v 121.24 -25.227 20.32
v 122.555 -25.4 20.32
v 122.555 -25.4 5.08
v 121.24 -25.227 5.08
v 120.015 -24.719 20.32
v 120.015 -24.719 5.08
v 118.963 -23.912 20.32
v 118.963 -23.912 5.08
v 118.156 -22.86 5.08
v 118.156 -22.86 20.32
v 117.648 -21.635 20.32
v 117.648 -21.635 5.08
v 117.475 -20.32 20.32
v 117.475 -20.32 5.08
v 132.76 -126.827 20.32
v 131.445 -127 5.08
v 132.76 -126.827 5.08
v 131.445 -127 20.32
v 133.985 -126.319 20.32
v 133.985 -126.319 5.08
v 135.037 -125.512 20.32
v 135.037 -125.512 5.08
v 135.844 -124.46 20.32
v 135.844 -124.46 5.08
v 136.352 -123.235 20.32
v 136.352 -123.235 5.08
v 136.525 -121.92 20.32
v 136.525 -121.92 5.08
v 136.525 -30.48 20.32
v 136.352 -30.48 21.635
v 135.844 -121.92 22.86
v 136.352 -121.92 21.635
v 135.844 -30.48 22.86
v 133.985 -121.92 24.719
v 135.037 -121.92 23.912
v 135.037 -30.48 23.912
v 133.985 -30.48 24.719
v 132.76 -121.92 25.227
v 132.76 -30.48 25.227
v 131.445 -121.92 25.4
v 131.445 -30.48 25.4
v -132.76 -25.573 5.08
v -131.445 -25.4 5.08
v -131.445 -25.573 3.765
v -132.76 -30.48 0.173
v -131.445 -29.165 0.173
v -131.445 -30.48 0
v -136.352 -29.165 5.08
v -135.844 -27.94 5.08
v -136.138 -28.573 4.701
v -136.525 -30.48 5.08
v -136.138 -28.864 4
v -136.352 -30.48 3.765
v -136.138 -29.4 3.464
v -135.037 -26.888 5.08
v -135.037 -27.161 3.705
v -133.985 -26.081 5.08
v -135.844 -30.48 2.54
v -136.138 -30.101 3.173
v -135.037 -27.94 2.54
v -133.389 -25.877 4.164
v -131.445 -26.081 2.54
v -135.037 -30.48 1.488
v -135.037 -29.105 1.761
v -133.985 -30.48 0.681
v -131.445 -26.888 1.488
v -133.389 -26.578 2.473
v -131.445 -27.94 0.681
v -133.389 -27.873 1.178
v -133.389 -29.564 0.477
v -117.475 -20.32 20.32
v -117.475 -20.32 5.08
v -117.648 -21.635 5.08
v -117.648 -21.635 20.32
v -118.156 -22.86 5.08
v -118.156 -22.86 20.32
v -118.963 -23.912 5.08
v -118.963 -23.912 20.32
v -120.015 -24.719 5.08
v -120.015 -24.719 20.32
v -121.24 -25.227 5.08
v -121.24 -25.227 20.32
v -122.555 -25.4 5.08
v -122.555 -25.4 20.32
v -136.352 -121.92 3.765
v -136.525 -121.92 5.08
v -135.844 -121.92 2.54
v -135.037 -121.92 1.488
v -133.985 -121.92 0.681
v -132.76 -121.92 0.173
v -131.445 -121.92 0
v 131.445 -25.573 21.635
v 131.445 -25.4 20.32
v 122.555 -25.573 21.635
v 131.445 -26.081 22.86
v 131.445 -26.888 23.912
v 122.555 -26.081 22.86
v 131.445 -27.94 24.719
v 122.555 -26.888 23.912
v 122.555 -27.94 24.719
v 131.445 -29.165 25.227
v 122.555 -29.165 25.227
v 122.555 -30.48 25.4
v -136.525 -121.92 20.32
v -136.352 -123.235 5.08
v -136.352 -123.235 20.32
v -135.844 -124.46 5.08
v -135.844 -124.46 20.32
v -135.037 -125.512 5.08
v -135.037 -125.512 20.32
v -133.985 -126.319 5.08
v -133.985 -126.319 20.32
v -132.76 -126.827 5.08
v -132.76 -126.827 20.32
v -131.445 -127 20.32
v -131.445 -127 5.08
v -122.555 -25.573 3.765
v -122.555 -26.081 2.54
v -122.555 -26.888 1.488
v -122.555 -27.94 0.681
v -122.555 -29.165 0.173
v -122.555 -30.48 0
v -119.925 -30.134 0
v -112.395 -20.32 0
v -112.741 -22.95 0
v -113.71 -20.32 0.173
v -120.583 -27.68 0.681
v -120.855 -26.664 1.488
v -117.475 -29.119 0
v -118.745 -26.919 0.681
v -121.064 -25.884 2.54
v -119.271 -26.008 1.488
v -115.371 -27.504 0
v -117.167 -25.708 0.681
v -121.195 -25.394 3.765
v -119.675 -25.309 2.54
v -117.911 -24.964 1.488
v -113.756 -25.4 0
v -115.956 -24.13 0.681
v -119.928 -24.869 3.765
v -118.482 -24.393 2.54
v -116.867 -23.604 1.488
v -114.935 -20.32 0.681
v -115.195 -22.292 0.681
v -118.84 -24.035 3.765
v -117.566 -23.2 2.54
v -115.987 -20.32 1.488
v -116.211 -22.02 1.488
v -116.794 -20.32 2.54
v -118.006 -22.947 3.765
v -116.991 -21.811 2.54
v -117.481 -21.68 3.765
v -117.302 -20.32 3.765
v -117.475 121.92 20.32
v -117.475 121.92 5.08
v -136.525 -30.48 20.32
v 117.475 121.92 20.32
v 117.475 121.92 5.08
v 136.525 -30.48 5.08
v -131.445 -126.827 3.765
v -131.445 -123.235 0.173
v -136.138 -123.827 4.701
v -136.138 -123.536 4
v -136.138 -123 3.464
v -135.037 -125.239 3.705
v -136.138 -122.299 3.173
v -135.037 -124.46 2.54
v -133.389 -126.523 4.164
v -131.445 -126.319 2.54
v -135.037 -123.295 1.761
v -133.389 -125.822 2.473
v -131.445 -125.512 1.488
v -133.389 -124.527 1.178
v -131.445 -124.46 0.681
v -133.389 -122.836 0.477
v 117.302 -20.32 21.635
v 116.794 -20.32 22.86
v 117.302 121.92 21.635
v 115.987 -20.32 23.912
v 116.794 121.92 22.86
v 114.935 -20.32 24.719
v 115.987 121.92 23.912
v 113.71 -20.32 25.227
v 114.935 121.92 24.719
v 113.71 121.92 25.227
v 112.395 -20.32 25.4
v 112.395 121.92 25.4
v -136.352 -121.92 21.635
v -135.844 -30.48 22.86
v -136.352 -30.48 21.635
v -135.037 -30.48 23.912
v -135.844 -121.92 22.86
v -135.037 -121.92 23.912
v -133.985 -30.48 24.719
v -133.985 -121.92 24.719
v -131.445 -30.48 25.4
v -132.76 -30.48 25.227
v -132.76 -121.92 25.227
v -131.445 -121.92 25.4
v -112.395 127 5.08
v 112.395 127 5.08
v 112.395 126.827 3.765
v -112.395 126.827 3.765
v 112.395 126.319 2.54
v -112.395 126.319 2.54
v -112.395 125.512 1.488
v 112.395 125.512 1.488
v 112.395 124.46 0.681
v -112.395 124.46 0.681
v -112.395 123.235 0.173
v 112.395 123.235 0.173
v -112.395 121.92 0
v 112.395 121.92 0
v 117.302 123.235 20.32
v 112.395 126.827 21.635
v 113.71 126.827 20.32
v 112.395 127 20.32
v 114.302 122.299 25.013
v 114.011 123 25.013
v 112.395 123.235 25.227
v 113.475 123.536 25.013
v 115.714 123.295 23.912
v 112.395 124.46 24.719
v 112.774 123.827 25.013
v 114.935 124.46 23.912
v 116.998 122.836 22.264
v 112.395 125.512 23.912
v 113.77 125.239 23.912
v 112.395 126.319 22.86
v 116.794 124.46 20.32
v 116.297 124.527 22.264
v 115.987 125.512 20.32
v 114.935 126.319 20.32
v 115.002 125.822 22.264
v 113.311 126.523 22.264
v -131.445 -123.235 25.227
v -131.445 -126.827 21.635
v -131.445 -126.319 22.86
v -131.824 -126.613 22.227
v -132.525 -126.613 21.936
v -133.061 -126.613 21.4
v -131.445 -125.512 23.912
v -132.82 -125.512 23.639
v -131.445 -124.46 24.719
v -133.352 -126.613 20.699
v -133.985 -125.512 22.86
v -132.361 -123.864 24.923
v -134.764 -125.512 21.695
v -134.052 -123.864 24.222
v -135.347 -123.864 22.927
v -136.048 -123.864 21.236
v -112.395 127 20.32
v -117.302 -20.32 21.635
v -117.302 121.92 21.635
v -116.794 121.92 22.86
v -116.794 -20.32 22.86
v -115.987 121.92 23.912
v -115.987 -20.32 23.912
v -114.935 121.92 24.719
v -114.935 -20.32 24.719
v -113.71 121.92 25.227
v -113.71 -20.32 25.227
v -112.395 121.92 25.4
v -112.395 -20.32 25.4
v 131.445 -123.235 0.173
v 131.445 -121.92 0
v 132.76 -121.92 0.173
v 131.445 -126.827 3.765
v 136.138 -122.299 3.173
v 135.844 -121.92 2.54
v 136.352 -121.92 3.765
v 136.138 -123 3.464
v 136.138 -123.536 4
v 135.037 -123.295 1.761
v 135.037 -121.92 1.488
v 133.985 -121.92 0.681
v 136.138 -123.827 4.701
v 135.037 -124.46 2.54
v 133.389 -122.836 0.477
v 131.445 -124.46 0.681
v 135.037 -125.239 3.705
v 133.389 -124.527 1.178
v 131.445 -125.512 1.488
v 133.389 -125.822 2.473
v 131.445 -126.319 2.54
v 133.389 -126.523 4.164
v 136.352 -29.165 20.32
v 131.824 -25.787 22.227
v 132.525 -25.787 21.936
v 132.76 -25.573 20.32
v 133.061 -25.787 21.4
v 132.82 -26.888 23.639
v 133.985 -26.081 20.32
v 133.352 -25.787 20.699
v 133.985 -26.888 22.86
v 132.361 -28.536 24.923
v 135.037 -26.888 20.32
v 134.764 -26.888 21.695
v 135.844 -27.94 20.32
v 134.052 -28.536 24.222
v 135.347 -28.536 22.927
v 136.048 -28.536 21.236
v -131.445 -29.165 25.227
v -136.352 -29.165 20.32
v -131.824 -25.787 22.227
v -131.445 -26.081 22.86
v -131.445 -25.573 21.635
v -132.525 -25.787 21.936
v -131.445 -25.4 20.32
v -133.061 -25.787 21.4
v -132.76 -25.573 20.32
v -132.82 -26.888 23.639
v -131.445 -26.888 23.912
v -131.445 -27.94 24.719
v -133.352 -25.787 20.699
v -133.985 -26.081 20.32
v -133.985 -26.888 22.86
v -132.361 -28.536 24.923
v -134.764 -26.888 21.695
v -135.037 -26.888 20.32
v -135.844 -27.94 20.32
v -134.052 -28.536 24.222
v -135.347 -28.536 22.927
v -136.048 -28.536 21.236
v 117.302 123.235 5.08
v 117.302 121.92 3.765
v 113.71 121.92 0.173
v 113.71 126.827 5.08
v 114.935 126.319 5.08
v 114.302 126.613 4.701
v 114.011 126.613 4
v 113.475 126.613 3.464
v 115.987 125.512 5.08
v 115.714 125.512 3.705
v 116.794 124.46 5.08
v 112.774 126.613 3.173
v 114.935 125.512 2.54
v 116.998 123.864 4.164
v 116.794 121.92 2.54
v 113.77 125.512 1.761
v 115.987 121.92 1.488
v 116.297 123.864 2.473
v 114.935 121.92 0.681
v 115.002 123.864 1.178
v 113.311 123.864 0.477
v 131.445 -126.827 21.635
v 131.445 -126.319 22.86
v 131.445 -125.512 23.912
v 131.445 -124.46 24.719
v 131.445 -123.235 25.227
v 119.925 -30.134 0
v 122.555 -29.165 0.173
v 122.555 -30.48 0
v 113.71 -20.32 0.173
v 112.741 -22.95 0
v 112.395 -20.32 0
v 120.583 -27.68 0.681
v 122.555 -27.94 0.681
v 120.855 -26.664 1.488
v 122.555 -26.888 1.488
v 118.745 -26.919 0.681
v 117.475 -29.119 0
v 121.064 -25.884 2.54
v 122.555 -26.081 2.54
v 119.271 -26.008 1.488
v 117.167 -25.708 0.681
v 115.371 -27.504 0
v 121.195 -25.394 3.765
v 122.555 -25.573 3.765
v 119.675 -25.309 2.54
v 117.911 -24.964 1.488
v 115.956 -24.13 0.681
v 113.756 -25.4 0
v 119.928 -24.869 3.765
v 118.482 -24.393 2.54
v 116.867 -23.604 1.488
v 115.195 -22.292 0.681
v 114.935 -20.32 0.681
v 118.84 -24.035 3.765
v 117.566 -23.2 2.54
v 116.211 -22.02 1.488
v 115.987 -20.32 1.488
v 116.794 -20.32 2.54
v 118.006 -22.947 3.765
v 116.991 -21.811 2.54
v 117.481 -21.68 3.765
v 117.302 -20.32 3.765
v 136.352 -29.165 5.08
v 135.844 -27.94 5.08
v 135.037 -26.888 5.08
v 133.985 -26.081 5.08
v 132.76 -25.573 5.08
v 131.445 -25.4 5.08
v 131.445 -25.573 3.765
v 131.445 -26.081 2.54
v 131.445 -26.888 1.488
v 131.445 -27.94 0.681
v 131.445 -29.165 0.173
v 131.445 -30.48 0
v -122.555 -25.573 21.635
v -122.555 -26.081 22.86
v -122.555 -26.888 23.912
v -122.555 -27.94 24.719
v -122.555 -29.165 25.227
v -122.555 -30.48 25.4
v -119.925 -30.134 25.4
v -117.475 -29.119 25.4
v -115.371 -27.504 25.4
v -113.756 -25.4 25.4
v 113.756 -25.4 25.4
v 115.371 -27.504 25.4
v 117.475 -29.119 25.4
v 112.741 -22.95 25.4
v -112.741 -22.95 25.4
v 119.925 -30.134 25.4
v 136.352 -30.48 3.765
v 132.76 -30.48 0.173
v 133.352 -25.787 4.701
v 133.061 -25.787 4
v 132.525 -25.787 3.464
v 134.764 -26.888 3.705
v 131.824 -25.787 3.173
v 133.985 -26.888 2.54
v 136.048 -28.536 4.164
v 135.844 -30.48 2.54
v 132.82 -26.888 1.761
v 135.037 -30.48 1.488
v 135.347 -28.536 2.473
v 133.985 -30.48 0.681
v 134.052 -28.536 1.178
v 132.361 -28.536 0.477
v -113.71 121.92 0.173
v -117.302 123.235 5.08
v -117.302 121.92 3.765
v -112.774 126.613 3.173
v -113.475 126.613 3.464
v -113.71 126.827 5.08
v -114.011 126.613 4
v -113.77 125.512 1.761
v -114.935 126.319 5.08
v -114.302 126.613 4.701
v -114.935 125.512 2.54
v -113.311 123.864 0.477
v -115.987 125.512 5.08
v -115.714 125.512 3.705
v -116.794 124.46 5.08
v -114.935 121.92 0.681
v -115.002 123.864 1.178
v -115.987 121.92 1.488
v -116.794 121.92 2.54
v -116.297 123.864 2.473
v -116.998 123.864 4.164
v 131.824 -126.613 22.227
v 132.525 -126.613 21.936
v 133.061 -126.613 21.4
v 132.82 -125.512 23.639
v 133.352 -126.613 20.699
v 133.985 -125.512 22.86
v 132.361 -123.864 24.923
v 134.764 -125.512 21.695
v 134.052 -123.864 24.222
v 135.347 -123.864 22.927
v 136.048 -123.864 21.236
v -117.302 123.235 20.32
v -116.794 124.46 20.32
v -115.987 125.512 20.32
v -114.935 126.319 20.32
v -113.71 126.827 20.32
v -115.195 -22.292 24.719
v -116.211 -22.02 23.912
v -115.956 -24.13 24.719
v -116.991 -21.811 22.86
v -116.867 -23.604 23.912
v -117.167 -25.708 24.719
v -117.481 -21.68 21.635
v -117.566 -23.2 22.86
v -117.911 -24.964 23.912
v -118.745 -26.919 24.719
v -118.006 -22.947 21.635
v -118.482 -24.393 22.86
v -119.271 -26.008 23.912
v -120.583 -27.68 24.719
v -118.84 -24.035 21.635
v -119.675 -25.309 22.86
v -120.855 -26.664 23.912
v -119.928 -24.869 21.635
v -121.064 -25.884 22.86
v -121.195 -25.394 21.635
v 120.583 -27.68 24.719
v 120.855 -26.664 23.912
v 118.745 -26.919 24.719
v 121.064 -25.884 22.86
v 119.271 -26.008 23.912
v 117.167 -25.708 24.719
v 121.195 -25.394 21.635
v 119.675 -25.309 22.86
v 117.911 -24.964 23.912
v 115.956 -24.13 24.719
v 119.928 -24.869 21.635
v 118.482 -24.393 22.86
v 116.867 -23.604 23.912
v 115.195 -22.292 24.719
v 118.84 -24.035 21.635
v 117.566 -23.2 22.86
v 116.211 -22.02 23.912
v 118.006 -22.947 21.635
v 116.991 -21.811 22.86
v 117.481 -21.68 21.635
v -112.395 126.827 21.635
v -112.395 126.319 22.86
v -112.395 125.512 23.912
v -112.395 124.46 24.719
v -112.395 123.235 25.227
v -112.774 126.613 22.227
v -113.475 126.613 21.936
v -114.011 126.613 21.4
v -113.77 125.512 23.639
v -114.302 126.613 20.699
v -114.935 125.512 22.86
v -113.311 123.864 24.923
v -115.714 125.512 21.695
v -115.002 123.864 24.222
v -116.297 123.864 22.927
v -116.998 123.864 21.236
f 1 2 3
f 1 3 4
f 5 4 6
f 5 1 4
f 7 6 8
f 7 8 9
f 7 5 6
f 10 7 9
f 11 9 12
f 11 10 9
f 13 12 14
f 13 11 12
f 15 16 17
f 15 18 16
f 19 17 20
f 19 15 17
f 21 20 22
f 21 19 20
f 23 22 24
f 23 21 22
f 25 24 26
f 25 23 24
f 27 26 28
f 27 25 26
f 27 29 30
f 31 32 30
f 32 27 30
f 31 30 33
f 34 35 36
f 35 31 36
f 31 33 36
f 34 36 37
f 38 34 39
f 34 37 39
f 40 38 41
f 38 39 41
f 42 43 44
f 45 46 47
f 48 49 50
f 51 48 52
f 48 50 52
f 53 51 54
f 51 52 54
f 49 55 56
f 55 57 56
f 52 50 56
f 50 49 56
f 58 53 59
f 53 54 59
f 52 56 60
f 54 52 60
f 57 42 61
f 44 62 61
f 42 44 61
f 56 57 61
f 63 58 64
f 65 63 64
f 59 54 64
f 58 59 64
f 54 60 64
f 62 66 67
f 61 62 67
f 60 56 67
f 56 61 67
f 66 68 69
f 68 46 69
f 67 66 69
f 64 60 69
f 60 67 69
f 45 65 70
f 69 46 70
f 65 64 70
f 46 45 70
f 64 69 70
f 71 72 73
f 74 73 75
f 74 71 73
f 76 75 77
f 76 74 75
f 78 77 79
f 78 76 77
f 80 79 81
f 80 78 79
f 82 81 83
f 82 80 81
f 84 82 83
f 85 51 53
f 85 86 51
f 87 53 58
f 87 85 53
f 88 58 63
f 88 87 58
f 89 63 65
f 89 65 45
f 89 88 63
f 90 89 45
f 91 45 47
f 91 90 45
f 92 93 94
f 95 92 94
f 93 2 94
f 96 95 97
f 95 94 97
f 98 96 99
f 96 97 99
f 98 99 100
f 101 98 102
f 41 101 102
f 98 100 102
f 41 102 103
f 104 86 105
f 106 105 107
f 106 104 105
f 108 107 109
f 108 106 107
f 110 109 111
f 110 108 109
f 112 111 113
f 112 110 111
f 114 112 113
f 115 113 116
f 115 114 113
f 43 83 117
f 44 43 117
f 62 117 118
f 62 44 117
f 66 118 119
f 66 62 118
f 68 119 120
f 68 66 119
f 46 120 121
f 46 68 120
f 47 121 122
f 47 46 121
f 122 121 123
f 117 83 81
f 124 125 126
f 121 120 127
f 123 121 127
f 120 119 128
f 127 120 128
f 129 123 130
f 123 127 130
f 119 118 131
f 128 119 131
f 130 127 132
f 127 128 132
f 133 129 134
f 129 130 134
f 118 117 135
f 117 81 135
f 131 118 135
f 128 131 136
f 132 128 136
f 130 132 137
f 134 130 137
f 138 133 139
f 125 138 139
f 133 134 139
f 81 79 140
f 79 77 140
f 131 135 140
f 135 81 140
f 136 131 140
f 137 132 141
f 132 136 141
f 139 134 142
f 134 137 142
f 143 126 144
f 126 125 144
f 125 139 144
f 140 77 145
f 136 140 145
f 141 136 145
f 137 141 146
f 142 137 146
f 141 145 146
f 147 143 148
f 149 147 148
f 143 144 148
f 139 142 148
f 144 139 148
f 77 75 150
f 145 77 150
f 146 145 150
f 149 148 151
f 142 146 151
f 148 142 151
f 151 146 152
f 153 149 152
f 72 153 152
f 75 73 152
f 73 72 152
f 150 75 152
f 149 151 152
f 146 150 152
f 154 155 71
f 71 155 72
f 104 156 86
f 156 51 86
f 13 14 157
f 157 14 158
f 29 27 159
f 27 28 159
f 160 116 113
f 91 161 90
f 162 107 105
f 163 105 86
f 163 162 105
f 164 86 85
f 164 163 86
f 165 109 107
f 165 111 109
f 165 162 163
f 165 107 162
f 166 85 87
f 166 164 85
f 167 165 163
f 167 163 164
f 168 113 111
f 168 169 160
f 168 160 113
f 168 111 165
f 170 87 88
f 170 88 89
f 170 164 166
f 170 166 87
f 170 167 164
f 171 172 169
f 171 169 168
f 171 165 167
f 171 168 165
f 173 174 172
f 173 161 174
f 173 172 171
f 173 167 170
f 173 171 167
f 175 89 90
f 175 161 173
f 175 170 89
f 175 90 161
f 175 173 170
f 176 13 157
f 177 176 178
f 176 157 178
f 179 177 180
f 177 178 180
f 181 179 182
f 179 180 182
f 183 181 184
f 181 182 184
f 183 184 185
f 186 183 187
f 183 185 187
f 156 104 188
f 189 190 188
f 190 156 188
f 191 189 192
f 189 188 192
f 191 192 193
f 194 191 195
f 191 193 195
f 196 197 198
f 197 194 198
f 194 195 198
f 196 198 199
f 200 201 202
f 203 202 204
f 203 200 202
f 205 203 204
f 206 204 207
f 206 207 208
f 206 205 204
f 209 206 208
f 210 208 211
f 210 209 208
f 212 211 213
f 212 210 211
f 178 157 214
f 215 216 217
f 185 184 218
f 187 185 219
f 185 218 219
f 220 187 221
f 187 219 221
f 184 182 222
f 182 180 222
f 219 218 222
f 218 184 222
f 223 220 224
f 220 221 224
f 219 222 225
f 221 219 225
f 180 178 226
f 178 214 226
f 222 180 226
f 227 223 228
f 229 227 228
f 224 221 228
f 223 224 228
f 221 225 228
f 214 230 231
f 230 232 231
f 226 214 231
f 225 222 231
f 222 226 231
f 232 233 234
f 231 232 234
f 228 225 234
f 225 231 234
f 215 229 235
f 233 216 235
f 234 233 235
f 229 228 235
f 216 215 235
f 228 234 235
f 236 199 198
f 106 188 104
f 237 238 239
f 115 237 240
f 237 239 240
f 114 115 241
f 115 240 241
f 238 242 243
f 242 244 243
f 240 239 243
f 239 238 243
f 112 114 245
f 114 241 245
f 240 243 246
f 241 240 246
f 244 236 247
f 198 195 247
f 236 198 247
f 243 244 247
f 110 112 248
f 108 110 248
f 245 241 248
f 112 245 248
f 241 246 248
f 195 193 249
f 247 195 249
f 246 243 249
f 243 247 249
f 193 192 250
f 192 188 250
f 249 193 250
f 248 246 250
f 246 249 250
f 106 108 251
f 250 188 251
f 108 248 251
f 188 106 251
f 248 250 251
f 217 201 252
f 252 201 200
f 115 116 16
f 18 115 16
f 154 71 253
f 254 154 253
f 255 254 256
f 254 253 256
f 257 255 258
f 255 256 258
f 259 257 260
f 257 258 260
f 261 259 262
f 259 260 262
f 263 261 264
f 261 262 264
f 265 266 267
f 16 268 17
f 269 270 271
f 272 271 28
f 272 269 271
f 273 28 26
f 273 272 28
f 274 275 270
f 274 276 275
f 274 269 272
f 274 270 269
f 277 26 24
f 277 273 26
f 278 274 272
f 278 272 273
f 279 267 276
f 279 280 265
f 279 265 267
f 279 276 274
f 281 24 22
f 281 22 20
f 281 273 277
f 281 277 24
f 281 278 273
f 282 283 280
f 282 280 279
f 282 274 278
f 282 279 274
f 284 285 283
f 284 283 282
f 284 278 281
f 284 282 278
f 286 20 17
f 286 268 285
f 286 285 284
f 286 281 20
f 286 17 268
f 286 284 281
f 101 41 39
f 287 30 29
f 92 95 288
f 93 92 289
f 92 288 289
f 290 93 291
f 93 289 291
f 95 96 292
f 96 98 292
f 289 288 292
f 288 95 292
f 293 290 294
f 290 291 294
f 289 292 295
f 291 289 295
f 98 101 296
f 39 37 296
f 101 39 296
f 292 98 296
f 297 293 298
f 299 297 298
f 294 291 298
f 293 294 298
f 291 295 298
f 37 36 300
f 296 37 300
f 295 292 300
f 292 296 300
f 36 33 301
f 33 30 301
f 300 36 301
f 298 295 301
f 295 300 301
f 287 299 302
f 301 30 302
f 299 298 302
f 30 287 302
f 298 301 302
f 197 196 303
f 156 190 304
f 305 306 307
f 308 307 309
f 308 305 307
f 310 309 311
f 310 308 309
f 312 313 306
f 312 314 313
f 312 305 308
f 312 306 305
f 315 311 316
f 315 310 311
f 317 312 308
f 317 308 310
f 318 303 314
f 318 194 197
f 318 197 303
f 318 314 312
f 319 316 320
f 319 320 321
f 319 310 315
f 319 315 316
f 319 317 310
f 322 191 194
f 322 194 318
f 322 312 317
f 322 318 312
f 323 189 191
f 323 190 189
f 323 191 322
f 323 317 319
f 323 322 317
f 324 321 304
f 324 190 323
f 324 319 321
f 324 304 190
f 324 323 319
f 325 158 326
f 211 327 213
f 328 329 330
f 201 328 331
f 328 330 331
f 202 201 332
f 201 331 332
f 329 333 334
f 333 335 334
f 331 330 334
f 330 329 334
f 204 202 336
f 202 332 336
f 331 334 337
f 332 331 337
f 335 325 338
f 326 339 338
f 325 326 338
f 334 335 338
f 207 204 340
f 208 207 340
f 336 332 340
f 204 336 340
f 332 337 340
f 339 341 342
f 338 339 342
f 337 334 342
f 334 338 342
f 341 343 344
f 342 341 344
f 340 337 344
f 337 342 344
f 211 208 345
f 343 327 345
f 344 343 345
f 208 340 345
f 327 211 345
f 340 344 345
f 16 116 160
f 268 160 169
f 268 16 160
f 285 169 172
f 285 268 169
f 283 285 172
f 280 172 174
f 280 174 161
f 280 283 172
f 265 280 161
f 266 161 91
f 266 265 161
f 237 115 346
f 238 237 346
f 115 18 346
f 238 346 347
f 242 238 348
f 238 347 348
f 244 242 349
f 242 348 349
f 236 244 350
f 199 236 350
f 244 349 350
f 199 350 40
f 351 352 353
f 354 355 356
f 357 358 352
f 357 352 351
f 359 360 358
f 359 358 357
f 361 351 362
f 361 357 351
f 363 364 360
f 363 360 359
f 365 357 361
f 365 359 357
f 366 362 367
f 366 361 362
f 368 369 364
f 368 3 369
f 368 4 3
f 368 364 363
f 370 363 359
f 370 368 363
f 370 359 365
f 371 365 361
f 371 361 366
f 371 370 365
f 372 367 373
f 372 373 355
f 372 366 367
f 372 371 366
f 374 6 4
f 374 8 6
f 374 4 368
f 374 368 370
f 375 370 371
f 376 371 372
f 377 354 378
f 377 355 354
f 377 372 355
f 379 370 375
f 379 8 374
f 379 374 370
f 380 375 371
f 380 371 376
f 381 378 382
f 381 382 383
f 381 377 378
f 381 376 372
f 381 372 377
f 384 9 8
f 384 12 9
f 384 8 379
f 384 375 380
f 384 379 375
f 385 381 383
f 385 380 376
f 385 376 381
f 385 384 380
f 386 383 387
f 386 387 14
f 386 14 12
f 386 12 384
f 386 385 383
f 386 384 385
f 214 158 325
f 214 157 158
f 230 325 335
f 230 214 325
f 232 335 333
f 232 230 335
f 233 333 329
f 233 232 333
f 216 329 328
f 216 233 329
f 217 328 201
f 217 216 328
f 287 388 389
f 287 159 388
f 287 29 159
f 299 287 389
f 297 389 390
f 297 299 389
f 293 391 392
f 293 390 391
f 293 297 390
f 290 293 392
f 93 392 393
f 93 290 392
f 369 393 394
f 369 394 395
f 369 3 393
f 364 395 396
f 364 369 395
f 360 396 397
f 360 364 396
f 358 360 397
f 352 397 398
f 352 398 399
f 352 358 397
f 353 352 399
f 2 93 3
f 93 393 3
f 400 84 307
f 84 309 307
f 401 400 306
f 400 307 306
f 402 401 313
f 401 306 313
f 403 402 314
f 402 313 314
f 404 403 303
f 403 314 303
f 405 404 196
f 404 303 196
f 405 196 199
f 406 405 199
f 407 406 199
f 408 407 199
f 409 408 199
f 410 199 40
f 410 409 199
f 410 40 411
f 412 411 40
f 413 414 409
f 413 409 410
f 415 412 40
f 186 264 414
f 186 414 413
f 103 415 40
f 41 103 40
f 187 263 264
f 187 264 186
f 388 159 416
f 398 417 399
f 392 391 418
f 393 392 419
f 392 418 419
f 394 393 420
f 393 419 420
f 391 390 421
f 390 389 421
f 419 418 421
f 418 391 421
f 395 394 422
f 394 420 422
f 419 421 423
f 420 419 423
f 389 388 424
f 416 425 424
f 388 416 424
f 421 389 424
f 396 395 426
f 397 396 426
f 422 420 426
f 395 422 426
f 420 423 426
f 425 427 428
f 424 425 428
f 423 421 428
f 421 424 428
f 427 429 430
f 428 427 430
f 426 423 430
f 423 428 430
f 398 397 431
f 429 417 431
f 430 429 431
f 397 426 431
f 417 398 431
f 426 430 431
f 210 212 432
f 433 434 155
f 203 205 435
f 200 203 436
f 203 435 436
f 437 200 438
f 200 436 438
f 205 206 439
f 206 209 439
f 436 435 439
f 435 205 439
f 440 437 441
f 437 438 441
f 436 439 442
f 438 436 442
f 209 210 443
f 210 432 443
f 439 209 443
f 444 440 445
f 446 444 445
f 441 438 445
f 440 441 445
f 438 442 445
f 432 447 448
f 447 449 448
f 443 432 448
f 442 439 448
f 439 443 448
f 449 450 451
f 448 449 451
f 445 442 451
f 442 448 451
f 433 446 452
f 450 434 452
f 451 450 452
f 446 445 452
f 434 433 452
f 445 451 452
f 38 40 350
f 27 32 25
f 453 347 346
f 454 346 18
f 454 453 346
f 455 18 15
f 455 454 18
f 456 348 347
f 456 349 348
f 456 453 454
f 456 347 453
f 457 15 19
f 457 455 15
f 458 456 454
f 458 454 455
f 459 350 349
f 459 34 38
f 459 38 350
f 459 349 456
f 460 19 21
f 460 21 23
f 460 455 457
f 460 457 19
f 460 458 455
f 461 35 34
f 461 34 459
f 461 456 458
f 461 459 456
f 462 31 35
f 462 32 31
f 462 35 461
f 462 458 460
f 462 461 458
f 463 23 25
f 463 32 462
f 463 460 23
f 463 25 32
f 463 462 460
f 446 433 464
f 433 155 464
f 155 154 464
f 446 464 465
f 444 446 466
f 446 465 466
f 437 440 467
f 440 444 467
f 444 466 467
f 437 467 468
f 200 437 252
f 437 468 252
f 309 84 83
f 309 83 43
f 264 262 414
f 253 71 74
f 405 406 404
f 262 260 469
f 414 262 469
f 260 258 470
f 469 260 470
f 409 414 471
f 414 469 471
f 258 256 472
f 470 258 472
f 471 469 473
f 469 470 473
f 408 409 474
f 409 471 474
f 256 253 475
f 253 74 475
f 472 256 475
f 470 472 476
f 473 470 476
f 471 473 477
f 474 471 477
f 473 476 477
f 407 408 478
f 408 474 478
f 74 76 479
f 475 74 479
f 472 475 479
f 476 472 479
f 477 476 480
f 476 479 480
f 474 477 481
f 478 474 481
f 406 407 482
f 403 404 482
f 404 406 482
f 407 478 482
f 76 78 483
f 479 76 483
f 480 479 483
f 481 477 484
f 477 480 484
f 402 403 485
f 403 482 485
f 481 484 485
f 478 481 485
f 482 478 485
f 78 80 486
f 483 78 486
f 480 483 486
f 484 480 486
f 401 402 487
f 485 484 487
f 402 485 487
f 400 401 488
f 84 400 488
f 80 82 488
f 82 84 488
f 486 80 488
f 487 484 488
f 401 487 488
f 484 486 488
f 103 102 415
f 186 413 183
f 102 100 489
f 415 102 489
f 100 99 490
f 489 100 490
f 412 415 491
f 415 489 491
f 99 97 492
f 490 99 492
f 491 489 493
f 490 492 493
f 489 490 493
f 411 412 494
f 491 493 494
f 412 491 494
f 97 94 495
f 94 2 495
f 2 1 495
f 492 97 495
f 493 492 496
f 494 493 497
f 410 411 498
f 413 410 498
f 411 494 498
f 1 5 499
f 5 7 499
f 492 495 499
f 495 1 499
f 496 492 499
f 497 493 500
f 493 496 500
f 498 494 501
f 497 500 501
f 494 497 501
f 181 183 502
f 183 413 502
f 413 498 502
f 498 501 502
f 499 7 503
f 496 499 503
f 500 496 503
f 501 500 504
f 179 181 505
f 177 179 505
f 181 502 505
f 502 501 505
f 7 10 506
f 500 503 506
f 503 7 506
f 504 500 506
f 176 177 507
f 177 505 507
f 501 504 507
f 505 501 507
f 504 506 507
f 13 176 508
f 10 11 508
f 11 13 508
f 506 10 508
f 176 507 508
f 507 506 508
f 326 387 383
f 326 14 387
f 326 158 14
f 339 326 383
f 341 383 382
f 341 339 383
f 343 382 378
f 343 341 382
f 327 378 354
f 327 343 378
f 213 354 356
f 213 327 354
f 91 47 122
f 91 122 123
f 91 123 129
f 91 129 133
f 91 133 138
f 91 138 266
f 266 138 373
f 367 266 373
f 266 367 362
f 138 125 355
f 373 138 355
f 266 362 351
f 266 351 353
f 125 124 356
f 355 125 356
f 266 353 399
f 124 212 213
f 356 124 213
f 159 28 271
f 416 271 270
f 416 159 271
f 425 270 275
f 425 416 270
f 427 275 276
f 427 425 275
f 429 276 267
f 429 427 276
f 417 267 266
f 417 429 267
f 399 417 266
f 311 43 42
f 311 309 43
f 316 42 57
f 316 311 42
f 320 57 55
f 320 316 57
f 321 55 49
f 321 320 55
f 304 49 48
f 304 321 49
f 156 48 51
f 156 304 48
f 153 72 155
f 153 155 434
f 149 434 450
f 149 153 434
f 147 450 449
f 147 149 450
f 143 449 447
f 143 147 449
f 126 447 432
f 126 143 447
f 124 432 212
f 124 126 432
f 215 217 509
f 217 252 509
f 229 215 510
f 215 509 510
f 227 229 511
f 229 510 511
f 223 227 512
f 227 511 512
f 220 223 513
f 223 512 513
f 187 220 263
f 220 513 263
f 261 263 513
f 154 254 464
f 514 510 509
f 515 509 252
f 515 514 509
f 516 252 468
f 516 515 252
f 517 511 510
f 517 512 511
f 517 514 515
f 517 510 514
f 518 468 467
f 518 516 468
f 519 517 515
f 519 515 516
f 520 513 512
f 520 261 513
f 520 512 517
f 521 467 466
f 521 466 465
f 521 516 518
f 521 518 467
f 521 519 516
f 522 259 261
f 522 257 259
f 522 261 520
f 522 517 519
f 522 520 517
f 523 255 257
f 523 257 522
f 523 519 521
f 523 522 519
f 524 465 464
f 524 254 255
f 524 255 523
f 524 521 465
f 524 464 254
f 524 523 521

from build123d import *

# Parameters (mm, degrees)
F1_DEPTH = 25.4
F2_R     = 5.08


with BuildPart() as f1:
    # F0 (on Top) → F1 (new body)
    with BuildSketch(Plane.XY):
        Polygon((0, 127), (-117.475, 127), (-117.475, -25.4), (-136.525, -25.4), (-136.525, -127), (0, -127), align=None)
        Polygon((117.475, 127), (0, 127), (0, -127), (136.525, -127), (136.525, -25.4), (117.475, -25.4), align=None)
    extrude(amount=F1_DEPTH)

    # F2
    f2_edges = [f1.edges().sort_by_distance(p)[0] for p in [
        (0, -127, 0),
        (-117.475, 50.8, 25.4),
        (117.475, 50.8, 0),
        (136.525, -76.2, 25.4),
        (127, -25.4, 25.4),
        (117.475, 127, 12.7),
        (136.525, -76.2, 0),
        (-136.525, -76.2, 25.4),
        (117.475, 50.8, 25.4),
        (0, -127, 25.4),
        (0, 127, 25.4),
        (136.525, -25.4, 12.7),
        (-127, -25.4, 0),
        (-127, -25.4, 25.4),
        (-136.525, -25.4, 12.7),
        (-117.475, 50.8, 0),
        (0, 127, 0),
        (-136.525, -127, 12.7),
        (136.525, -127, 12.7),
        (117.475, -25.4, 12.7),
        (-136.525, -76.2, 0),
        (-117.475, -25.4, 12.7),
        (-117.475, 127, 12.7),
        (127, -25.4, 0),
    ]]
    fillet(f2_edges, radius=F2_R)


solid = f1.part
